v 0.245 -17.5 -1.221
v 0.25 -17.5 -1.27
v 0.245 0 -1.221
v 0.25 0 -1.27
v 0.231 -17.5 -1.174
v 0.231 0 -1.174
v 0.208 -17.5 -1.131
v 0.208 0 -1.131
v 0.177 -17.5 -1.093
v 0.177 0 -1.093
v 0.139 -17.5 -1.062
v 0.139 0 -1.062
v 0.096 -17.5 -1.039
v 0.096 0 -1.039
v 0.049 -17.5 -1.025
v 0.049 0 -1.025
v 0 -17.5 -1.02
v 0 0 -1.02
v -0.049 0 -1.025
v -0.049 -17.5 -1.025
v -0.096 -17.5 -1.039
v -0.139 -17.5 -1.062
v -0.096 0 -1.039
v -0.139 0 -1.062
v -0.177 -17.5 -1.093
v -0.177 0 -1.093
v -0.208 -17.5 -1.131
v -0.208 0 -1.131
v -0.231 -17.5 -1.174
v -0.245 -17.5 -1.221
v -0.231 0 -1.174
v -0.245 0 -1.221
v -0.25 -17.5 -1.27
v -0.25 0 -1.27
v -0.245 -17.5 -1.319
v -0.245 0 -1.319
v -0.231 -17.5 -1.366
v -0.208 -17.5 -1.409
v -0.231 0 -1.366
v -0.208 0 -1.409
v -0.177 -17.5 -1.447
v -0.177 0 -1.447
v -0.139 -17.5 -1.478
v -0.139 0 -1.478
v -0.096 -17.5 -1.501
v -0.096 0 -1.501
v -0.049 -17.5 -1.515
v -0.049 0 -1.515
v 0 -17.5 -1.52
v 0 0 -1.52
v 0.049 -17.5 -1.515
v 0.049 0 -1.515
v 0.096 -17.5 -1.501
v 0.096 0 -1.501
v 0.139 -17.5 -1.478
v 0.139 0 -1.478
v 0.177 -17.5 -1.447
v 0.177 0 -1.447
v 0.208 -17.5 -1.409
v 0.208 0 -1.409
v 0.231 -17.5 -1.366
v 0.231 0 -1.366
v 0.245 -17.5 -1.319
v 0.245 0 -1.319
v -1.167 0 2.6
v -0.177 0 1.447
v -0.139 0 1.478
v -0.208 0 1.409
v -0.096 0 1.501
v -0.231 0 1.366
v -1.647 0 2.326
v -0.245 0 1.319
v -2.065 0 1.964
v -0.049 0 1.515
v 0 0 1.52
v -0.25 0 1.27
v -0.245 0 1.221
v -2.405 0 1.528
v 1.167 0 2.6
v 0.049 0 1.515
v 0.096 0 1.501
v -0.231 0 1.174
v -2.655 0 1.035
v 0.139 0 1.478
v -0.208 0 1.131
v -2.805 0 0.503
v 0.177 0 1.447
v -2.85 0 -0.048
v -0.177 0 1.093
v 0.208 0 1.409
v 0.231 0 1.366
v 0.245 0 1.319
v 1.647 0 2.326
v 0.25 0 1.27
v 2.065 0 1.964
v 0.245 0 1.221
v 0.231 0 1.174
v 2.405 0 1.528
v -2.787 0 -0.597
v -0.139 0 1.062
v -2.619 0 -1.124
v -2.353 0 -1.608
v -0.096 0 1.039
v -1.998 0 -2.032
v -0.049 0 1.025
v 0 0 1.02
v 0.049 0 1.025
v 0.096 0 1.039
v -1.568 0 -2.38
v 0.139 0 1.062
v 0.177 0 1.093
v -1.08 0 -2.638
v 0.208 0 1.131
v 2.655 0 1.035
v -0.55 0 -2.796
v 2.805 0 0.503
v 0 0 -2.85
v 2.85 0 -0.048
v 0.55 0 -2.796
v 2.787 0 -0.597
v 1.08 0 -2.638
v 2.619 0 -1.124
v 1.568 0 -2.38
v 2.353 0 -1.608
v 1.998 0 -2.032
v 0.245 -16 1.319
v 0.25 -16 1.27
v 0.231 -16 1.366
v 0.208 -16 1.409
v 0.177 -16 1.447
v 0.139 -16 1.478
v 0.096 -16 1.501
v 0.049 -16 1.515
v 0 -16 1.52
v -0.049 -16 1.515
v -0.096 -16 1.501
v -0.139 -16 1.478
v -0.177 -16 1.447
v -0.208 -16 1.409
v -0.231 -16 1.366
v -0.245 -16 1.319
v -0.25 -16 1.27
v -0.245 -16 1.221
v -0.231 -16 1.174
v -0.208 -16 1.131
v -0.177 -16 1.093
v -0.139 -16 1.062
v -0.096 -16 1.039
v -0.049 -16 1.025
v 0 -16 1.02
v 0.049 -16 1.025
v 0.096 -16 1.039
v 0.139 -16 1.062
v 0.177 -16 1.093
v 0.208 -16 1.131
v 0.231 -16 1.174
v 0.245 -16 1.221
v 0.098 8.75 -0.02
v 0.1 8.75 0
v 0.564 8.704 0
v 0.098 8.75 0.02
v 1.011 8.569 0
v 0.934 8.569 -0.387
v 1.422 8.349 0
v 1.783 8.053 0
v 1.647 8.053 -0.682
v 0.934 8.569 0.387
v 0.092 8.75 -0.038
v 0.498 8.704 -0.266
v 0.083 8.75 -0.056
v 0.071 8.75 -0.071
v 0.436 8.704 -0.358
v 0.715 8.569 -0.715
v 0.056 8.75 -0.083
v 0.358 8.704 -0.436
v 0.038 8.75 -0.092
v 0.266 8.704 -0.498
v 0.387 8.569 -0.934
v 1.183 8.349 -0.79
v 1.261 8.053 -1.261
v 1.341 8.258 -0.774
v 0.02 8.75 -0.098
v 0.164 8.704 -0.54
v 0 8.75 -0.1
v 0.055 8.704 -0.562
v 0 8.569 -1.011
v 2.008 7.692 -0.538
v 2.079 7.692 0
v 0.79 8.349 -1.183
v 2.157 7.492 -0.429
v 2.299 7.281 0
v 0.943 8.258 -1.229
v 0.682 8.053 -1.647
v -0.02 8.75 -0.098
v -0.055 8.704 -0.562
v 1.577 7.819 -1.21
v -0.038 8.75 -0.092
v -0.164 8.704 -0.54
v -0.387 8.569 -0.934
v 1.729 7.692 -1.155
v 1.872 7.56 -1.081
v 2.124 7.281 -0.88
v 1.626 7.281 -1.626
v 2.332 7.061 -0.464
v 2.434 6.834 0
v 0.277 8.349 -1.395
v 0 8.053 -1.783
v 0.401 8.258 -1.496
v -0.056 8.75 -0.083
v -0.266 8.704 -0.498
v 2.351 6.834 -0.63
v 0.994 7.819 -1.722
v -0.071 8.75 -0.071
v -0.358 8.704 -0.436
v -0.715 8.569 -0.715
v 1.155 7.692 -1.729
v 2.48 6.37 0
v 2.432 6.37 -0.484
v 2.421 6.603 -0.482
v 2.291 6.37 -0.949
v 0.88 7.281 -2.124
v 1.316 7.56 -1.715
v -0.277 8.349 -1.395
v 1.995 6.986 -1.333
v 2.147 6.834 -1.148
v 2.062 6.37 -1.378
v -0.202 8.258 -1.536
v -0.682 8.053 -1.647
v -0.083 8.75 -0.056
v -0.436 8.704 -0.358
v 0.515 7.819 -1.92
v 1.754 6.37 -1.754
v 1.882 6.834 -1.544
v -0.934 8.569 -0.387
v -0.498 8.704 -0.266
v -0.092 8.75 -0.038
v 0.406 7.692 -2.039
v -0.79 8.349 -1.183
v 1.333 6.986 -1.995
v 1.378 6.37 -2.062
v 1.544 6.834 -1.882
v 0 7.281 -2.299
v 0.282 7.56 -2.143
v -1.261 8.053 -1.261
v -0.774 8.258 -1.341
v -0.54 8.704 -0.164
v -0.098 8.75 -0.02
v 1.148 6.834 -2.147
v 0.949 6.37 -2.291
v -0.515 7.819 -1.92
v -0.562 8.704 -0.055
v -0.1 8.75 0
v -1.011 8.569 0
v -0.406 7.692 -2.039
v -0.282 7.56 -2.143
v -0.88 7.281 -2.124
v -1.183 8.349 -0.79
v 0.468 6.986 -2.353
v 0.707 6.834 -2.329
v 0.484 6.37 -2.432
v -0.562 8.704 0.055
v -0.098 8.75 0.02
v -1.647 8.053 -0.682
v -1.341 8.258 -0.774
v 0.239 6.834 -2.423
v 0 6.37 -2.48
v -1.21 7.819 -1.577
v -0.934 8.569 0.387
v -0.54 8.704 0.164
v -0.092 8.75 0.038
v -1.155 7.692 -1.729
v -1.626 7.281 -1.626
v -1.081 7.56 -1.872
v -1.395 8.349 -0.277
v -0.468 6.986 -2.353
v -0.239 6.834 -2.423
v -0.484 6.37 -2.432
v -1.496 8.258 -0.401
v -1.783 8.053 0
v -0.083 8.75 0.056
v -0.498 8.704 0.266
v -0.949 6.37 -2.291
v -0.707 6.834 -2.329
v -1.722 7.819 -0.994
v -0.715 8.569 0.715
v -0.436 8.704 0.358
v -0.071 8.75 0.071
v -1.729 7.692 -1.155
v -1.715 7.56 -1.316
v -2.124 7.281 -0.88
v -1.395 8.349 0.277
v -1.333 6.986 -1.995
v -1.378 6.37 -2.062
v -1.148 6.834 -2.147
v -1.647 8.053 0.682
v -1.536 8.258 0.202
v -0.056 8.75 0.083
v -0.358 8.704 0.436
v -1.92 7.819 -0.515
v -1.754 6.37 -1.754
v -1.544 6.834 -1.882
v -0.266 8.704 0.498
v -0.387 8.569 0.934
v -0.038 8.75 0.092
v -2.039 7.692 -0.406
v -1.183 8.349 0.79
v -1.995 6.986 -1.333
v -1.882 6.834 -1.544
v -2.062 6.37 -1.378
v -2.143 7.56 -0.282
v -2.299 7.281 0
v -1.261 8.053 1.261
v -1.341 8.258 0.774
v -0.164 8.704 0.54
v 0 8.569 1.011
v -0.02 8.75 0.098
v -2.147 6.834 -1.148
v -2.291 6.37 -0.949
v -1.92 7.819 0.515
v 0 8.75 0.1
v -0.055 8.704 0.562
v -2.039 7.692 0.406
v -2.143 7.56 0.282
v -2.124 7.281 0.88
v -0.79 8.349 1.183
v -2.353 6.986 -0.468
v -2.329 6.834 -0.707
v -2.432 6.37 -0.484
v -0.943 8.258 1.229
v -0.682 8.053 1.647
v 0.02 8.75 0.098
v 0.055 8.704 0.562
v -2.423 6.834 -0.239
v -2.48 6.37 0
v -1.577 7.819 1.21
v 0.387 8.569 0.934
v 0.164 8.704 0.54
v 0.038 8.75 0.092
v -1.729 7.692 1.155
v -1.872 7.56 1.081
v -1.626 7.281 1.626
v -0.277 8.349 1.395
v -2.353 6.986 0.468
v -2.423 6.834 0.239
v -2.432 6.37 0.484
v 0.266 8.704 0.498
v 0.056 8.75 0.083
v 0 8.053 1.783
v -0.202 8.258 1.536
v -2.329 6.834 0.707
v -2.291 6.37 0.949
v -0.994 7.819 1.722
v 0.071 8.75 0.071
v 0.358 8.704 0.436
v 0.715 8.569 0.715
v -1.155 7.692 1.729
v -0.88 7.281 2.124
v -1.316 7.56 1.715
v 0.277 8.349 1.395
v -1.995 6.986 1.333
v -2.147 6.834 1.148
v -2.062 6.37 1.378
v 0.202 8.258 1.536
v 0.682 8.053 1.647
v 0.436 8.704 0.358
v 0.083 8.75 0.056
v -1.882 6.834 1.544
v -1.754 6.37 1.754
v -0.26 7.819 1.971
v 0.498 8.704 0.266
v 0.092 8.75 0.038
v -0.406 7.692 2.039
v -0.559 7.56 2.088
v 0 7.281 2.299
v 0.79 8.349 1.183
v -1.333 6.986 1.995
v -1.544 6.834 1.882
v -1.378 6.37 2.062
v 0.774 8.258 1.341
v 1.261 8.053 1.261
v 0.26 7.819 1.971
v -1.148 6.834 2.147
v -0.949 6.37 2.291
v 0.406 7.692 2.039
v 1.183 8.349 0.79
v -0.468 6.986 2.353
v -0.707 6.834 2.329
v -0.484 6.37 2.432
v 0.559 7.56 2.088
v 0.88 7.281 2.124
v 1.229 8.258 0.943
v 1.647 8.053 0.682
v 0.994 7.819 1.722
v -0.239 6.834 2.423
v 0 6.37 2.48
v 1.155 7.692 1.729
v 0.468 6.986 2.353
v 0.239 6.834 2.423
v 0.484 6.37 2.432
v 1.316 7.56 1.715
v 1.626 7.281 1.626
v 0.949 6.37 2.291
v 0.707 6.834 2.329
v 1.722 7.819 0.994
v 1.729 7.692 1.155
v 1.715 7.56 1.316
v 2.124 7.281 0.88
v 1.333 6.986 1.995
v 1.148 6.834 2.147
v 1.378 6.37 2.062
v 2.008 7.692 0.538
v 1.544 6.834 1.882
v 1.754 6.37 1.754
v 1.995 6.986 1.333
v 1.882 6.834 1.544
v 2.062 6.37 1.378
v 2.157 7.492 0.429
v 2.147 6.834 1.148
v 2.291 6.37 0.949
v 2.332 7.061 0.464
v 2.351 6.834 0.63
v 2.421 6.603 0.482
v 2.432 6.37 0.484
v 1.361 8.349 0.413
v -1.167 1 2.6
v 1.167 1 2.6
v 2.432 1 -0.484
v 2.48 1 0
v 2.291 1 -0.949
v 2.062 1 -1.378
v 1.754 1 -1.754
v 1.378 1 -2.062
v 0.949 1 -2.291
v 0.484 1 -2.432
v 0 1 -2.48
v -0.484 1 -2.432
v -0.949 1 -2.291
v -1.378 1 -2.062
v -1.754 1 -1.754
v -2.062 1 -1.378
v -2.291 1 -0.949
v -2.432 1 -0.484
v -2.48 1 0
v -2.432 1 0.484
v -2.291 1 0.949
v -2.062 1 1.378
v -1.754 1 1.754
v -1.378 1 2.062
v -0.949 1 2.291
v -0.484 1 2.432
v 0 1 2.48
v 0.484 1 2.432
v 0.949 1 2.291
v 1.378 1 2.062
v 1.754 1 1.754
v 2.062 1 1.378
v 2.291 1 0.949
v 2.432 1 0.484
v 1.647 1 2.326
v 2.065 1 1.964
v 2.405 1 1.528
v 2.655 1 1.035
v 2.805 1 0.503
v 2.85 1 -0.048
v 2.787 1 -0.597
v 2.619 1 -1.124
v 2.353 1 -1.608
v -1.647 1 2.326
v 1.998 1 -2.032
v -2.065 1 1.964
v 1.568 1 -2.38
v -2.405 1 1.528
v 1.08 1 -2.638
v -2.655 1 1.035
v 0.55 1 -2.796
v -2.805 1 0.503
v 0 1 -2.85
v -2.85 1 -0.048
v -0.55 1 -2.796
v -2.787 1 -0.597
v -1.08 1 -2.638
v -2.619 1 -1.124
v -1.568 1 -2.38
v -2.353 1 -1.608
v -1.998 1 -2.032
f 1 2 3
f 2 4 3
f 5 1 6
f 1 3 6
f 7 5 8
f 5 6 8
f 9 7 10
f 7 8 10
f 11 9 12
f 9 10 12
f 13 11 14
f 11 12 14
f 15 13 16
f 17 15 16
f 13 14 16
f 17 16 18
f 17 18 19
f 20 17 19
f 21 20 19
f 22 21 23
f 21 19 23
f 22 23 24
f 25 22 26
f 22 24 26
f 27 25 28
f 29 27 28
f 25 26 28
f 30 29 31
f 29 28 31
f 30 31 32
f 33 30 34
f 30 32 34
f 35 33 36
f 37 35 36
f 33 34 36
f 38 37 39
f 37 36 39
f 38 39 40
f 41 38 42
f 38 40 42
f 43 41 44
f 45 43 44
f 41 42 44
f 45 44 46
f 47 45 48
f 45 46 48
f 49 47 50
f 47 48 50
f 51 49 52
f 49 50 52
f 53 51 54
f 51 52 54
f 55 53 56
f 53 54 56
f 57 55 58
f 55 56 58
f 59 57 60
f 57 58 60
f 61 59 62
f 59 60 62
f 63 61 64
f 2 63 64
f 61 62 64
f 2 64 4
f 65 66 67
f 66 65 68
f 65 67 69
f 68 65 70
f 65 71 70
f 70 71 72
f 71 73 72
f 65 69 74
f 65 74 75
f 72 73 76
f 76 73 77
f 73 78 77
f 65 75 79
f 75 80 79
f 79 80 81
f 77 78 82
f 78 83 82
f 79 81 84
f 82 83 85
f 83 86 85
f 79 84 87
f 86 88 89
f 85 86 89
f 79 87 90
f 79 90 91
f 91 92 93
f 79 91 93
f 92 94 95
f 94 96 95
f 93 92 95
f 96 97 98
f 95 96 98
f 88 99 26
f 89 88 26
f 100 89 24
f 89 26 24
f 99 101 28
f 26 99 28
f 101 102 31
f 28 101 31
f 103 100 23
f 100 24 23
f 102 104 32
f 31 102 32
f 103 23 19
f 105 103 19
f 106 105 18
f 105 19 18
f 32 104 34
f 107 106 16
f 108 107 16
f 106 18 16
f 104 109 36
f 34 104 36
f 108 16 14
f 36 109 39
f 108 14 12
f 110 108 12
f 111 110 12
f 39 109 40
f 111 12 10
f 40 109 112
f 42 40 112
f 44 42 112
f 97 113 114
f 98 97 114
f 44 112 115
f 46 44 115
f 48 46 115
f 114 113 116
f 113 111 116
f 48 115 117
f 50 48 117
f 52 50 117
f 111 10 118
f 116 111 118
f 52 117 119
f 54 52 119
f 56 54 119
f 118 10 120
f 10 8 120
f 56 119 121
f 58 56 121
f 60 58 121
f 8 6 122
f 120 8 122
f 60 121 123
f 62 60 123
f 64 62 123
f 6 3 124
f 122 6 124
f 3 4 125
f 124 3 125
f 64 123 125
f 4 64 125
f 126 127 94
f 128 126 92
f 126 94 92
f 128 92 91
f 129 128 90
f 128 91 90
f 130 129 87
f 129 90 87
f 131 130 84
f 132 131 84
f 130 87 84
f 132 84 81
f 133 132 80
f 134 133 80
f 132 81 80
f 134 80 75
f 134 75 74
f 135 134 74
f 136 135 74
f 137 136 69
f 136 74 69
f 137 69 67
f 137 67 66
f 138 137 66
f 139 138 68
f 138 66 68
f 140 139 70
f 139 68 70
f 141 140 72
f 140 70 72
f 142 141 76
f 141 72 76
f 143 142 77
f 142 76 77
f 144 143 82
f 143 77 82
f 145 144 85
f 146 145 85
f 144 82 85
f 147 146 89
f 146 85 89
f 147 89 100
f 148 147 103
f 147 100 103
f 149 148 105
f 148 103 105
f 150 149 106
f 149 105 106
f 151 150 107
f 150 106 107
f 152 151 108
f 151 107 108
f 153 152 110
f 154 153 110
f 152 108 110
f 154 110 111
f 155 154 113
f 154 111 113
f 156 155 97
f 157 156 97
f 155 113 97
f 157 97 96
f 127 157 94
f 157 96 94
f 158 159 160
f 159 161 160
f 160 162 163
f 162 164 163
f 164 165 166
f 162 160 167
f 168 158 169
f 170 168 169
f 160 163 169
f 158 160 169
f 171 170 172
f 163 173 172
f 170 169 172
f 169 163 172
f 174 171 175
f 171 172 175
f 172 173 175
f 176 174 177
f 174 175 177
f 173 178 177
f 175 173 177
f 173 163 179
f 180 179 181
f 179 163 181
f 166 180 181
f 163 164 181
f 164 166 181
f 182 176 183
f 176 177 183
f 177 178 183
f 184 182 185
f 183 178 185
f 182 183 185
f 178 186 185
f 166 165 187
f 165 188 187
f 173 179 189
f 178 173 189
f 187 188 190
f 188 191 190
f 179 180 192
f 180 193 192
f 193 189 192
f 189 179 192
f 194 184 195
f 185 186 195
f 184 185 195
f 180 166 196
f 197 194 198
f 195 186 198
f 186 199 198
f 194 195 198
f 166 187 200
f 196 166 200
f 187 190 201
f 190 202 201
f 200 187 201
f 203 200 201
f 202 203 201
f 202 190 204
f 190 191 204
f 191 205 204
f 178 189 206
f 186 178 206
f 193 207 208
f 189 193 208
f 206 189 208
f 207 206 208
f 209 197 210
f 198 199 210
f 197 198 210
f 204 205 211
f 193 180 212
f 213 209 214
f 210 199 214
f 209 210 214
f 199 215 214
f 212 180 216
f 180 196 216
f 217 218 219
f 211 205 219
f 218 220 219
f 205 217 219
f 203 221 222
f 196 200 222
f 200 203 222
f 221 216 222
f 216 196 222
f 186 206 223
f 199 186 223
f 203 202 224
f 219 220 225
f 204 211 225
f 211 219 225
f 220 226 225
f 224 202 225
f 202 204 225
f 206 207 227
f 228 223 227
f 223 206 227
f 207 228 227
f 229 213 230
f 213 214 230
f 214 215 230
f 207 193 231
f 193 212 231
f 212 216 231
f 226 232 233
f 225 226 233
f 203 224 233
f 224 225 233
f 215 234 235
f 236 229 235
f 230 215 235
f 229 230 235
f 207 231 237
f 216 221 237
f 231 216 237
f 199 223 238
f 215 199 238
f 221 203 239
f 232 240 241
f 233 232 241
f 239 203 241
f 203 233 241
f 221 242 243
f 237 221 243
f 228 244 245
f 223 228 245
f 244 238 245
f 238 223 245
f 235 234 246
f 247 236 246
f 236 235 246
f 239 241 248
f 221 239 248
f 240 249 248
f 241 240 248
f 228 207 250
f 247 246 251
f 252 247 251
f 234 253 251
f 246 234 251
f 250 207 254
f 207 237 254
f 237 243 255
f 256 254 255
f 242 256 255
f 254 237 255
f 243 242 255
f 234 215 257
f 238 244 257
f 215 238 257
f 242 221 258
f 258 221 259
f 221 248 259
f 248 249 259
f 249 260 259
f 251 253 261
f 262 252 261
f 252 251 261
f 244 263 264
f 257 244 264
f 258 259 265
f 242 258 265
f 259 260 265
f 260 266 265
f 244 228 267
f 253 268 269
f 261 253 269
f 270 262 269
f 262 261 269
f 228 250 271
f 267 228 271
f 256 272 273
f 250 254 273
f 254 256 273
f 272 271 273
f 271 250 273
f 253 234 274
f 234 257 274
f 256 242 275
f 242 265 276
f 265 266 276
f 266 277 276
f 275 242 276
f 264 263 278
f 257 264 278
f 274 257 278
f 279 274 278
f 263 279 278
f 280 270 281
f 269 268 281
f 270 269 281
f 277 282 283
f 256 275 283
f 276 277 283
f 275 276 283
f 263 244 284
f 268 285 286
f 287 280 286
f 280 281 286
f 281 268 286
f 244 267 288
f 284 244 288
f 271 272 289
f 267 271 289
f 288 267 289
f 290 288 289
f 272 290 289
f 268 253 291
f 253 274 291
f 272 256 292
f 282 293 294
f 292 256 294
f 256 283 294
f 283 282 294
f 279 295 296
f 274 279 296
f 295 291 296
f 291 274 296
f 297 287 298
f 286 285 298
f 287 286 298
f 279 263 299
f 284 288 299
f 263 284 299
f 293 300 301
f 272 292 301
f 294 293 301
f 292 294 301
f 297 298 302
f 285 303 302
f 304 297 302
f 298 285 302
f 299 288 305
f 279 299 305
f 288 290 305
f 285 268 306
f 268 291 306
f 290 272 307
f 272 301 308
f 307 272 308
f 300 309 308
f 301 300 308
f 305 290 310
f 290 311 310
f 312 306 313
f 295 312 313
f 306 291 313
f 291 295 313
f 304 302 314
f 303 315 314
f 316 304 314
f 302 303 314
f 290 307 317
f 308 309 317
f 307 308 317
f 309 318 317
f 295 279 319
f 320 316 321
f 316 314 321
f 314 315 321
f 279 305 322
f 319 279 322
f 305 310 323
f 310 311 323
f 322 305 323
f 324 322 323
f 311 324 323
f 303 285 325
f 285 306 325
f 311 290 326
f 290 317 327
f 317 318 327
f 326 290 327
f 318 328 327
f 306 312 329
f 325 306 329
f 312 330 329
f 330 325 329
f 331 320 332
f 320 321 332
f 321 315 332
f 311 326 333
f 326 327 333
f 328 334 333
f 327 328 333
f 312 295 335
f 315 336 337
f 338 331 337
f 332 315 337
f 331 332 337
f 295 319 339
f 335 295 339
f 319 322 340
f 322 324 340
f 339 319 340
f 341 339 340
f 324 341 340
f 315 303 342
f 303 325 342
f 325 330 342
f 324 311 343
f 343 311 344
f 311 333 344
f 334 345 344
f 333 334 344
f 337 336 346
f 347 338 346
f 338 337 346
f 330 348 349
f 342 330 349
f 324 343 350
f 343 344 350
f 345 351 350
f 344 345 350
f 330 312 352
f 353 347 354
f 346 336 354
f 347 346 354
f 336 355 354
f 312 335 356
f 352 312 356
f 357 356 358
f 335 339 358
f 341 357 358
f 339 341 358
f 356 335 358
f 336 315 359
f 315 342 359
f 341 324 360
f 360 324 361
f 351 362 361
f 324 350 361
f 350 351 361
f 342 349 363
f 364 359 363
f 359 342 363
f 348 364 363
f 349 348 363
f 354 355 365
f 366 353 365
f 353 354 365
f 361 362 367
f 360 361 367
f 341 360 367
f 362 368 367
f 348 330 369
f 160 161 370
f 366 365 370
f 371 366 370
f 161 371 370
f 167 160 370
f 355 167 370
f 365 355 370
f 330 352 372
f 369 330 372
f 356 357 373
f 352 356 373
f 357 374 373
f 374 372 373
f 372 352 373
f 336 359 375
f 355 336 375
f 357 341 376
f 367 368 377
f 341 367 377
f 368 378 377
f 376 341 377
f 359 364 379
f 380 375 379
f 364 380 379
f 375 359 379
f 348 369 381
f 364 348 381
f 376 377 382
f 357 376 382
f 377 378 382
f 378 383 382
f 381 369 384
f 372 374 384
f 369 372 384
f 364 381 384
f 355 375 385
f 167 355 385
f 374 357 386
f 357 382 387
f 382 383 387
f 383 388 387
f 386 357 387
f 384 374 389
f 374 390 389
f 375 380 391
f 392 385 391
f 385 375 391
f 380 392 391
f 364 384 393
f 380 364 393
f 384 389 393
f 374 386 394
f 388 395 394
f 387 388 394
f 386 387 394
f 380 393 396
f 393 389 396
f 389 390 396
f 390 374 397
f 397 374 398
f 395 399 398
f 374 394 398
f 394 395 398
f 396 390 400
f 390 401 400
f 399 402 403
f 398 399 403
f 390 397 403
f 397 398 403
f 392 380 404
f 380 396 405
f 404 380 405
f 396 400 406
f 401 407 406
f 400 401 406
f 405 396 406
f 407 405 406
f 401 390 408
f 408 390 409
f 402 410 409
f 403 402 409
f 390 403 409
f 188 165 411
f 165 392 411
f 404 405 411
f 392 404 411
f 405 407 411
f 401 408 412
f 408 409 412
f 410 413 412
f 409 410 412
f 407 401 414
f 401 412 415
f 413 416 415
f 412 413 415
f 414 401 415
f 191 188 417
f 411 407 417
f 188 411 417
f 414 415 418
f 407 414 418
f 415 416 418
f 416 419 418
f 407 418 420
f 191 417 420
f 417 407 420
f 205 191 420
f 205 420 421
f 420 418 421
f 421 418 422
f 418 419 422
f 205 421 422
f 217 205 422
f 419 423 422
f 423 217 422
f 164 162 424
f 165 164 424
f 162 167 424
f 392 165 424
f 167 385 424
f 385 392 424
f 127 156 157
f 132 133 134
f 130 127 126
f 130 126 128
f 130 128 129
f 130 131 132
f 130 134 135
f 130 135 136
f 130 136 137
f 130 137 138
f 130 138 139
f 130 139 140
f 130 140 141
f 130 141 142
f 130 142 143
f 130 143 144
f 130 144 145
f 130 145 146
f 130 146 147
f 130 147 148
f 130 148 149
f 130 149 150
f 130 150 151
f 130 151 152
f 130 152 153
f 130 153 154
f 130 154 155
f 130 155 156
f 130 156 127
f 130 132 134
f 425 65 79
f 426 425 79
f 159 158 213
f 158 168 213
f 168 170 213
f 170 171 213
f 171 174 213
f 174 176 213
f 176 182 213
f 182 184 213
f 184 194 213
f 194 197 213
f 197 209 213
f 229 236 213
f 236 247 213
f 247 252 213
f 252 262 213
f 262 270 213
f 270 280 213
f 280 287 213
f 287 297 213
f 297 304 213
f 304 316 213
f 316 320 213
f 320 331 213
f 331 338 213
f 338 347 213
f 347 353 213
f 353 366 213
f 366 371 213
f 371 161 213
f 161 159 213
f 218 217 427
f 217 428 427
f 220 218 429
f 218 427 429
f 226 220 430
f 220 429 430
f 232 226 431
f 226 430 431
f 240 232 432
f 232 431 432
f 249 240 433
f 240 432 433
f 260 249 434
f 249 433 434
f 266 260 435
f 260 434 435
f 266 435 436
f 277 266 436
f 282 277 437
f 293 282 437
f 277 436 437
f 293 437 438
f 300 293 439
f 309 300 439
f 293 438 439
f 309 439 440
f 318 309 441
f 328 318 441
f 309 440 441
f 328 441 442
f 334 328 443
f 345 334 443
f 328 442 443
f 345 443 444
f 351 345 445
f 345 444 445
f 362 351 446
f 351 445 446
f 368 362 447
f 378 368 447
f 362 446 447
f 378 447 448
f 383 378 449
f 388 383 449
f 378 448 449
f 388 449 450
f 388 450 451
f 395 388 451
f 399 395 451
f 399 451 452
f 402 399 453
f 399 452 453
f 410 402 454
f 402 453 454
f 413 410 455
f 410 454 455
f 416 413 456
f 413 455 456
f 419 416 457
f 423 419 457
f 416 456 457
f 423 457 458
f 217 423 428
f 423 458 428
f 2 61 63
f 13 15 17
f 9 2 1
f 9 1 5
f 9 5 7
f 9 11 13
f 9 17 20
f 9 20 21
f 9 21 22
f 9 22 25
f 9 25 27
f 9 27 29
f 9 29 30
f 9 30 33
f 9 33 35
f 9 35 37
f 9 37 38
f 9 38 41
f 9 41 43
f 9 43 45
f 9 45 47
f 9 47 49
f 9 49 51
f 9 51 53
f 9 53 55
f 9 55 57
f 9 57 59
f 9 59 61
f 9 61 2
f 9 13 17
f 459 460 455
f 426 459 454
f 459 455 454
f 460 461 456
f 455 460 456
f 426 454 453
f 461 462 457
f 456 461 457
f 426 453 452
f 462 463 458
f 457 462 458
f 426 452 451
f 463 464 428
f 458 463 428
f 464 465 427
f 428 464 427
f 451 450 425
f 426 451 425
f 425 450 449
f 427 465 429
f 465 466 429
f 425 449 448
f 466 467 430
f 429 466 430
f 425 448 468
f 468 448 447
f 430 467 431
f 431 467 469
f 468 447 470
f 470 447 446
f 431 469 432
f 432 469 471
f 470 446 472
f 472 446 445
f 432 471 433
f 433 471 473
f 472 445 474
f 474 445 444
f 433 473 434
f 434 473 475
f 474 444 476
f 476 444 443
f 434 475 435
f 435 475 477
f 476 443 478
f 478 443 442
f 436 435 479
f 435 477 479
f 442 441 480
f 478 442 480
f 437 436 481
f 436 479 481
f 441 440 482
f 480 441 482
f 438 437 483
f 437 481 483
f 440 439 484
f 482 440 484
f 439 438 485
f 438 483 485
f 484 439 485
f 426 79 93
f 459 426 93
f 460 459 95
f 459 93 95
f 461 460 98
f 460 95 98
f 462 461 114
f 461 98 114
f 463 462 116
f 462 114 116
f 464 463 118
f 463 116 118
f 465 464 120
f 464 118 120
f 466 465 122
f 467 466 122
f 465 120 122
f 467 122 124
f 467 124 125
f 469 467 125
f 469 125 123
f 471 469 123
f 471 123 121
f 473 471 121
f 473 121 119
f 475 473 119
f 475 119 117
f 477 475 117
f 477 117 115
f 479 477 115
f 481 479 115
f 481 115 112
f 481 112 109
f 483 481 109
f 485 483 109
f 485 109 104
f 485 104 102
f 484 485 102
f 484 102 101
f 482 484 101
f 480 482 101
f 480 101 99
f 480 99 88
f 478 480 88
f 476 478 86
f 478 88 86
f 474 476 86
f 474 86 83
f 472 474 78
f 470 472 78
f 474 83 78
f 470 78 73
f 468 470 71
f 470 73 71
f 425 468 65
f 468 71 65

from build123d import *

# Parameters (mm, degrees)
CUT_EXTRUDE1_DEPTH  = 1
SKETCH3_R           = 0.25
BOSS_EXTRUDE1_DEPTH = 16
SKETCH4_R           = 0.25
BOSS_EXTRUDE2_DEPTH = 1.5


with BuildPart() as part:
    # Sketch1 → Revolve1 (revolve)
    with BuildSketch(Plane.XY):
        with BuildLine():
            Line((0, 0), (0, 8.75))
            Line((0, 8.75), (0.1, 8.75))
            ThreePointArc((0.1, 8.75), (1.782914139, 8.052914139), (2.48, 6.37))
            Line((2.48, 6.37), (2.48, 1))
            Line((2.48, 1), (2.85, 1))
            Line((2.85, 1), (2.85, 0))
            Line((2.85, 0), (0, 0))
        make_face()
    revolve(axis=Axis((0, 0, 0), (0, 1, 0)))

    # Sketch2 → Cut-Extrude1 (cut)
    with BuildSketch(Plane.XZ):
        with BuildLine():
            Line((-1.167261753, 2.6), (1.167261753, 2.6))
            ThreePointArc((1.167261753, 2.6), (0, 2.85), (-1.167261753, 2.6))
        make_face()
    extrude(amount=-CUT_EXTRUDE1_DEPTH, mode=Mode.SUBTRACT)

    # Sketch3 → Boss-Extrude1 (add)
    with BuildSketch(Plane.XZ):
        with Locations((0, -1.27)):
            Circle(SKETCH3_R)
        with Locations((0, 1.27)):
            Circle(SKETCH3_R)
    extrude(amount=BOSS_EXTRUDE1_DEPTH)

    # Sketch4 → Boss-Extrude2 (add)
    with BuildSketch(Plane.XZ.offset(16)):
        with Locations((0, -1.27)):
            Circle(SKETCH4_R)
    extrude(amount=BOSS_EXTRUDE2_DEPTH)


solid = part.part
